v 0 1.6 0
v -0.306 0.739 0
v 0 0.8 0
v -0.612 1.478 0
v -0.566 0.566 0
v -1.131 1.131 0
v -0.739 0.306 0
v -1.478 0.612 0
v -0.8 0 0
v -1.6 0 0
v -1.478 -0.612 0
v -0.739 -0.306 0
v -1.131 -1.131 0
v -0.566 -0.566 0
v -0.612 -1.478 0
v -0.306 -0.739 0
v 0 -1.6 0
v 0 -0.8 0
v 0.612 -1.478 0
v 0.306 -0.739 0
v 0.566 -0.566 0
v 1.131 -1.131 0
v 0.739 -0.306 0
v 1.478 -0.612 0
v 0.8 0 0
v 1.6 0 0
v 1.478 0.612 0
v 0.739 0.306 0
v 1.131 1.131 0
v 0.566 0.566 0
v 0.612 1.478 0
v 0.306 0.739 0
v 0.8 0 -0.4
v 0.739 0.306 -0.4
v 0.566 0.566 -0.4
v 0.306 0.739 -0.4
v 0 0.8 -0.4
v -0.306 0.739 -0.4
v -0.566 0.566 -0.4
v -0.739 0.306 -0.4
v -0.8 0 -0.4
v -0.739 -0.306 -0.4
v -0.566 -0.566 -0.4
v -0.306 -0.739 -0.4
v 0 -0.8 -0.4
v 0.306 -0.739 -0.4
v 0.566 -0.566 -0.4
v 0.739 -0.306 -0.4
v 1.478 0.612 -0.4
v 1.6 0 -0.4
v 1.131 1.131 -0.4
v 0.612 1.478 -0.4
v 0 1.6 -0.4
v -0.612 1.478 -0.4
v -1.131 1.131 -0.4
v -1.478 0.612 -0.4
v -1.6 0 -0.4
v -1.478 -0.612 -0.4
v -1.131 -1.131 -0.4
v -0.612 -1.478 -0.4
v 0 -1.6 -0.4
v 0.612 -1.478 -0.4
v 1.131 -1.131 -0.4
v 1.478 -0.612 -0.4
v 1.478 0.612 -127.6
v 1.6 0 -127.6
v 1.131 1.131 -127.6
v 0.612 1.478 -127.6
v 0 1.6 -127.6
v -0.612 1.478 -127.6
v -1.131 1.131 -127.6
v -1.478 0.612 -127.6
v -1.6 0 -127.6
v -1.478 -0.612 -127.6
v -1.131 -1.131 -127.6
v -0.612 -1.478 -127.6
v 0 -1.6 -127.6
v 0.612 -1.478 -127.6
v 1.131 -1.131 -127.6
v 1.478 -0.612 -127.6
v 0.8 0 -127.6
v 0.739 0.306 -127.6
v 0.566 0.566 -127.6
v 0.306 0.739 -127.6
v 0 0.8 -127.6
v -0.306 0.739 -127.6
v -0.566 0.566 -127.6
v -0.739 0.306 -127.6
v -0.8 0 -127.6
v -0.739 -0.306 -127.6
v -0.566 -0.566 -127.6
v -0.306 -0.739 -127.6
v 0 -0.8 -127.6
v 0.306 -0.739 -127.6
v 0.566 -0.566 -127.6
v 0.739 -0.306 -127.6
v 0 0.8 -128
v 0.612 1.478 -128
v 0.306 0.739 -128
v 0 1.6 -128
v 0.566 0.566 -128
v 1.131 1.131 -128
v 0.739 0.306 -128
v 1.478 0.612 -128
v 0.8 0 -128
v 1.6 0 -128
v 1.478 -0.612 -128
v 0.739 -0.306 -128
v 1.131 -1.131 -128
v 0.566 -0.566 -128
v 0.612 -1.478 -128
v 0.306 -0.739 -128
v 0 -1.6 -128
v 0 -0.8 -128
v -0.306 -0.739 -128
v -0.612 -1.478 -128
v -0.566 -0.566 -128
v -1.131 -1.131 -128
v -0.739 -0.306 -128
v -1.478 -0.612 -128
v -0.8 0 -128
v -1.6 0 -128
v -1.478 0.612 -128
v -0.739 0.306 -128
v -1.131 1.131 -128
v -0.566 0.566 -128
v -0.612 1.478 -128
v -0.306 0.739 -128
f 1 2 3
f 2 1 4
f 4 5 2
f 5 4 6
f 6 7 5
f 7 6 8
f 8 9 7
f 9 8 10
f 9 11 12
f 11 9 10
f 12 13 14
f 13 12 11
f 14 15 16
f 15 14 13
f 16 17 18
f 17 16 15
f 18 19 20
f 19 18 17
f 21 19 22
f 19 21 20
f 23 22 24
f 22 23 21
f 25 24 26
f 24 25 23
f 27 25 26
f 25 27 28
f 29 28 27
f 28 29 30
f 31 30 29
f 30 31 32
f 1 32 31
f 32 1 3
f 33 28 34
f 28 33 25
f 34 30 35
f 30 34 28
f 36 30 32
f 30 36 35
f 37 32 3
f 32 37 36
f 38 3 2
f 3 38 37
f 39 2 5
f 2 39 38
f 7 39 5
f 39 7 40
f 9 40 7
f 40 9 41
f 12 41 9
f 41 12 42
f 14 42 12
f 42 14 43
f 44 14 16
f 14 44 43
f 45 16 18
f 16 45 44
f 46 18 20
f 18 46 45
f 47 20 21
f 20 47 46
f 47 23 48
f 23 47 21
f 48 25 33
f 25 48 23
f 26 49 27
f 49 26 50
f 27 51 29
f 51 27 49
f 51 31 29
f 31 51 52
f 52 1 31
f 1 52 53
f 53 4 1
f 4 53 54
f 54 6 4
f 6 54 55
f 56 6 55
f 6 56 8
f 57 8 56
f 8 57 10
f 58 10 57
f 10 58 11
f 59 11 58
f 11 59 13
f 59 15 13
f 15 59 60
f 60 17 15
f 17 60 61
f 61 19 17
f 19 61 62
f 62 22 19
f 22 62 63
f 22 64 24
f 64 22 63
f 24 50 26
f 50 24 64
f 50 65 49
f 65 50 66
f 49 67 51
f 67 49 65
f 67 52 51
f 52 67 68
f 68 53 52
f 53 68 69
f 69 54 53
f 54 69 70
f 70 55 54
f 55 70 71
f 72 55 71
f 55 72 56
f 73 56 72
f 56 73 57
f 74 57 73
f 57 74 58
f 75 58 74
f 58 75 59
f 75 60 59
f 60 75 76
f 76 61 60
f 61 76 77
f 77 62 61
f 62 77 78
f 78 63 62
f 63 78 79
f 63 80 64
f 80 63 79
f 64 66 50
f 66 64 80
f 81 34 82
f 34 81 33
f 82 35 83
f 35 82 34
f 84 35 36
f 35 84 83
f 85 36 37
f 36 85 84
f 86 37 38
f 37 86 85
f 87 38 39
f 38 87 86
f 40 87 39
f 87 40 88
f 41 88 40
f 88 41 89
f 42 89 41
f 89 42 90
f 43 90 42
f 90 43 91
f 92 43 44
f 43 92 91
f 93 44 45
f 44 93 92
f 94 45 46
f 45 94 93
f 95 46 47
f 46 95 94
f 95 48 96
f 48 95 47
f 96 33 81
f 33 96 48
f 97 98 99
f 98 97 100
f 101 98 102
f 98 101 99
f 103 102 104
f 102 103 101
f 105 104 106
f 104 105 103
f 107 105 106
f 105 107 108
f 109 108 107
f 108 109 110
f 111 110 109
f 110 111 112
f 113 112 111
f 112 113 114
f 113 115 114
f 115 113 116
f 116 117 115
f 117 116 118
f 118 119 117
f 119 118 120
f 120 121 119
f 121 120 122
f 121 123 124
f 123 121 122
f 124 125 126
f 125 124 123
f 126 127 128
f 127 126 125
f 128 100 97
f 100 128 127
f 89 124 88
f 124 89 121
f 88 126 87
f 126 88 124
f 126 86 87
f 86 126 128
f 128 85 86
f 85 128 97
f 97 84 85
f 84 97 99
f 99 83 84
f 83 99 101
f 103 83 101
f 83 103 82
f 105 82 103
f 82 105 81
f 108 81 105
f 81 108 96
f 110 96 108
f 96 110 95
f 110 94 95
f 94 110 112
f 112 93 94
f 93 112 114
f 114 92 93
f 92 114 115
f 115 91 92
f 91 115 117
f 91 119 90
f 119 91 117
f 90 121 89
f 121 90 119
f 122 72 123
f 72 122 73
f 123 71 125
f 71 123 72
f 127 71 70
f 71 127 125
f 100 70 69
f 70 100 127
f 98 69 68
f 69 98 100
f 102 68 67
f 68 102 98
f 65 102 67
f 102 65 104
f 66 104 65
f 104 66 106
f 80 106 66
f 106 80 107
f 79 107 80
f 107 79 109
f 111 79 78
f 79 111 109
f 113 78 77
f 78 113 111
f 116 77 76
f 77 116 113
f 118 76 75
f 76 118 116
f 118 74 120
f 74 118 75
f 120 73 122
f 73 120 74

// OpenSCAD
// file: ../p/4-4ring1.scad
use <../lib.scad>
function ldraw_lib__4_4ring1() = [
// 0 Ring  1 x 1.0
// 0 Name: 4-4ring1.dat
// 0 Author: James Jessiman
// 0 !LDRAW_ORG Primitive UPDATE 2009-01
// 0 !LICENSE Licensed under CC BY 4.0 : see CAreadme.txt
// 
// 0 BFC CERTIFY CCW
  [0,"BFC","CERTIFY"],
  [0,"BFC","CCW"],
// 
// 0 !HISTORY 1998-12-15 [PTadmin] Official Update 1998-10
// 0 !HISTORY 2002-04-08 [BrickCaster] Modified for BFC compliance
// 0 !HISTORY 2002-04-25 [PTadmin] Official Update 2002-02
// 0 !HISTORY 2007-06-24 [PTadmin] Header formatted for Contributor Agreement
// 0 !HISTORY 2008-07-01 [PTadmin] Official Update 2008-01
// 0 !HISTORY 2008-08-26 [cwdee] Switch polygon winding and rename
// 0 !HISTORY 2009-05-02 [PTadmin] Official Update 2009-01
// 
// 
// 4 16 -0.7654 0 1.8478 -0.3827 0 0.9239 0 0 1 0 0 2
  [4,16,-0.7654,0,1.8478,-0.3827,0,0.9239,0,0,1,0,0,2],
// 4 16 -1.4142 0 1.4142 -0.7071 0 0.7071 -0.3827 0 0.9239 -0.7654 0 1.8478
  [4,16,-1.4142,0,1.4142,-0.7071,0,0.7071,-0.3827,0,0.9239,-0.7654,0,1.8478],
// 4 16 -1.8478 0 0.7654 -0.9239 0 0.3827 -0.7071 0 0.7071 -1.4142 0 1.41420
  [4,16,-1.8478,0,0.7654,-0.9239,0,0.3827,-0.7071,0,0.7071,-1.4142,0,1.41420],
// 4 16 -2 0 0 -1 0 0 -0.9239 0 0.3827 -1.8478 0 0.7654
  [4,16,-2,0,0,-1,0,0,-0.9239,0,0.3827,-1.8478,0,0.7654],
// 4 16 -1.8478 0 -0.7654 -0.9239 0 -0.3827 -1 0 0 -2 0 0
  [4,16,-1.8478,0,-0.7654,-0.9239,0,-0.3827,-1,0,0,-2,0,0],
// 4 16 -1.4142 0 -1.4142 -0.7071 0 -0.7071 -0.9239 0 -0.3827 -1.8478 0 -0.7654
  [4,16,-1.4142,0,-1.4142,-0.7071,0,-0.7071,-0.9239,0,-0.3827,-1.8478,0,-0.7654],
// 4 16 -0.7654 0 -1.8478 -0.3827 0 -0.9239 -0.7071 0 -0.7071 -1.4142 0 -1.4142
  [4,16,-0.7654,0,-1.8478,-0.3827,0,-0.9239,-0.7071,0,-0.7071,-1.4142,0,-1.4142],
// 4 16 0 0 -2 0 0 -1 -0.3827 0 -0.9239 -0.7654 0 -1.8478
  [4,16,0,0,-2,0,0,-1,-0.3827,0,-0.9239,-0.7654,0,-1.8478],
// 4 16 0.7654 0 -1.8478 0.3827 0 -0.9239 0 0 -1 0 0 -2
  [4,16,0.7654,0,-1.8478,0.3827,0,-0.9239,0,0,-1,0,0,-2],
// 4 16 1.4142 0 -1.4142 0.7071 0 -0.7071 0.3827 0 -0.9239 0.7654 0 -1.8478
  [4,16,1.4142,0,-1.4142,0.7071,0,-0.7071,0.3827,0,-0.9239,0.7654,0,-1.8478],
// 4 16 1.8478 0 -0.7654 0.9239 0 -0.3827 0.7071 0 -0.7071 1.4142 0 -1.4142
  [4,16,1.8478,0,-0.7654,0.9239,0,-0.3827,0.7071,0,-0.7071,1.4142,0,-1.4142],
// 4 16 2 0 0 1 0 0 0.9239 0 -0.3827 1.8478 0 -0.7654
  [4,16,2,0,0,1,0,0,0.9239,0,-0.3827,1.8478,0,-0.7654],
// 4 16 1.8478 0 0.7654 0.9239 0 0.3827 1 0 0 2 0 0
  [4,16,1.8478,0,0.7654,0.9239,0,0.3827,1,0,0,2,0,0],
// 4 16 1.4142 0 1.4142 0.7071 0 0.7071 0.9239 0 0.3827 1.8478 0 0.7654
  [4,16,1.4142,0,1.4142,0.7071,0,0.7071,0.9239,0,0.3827,1.8478,0,0.7654],
// 4 16 0.7654 0 1.8478 0.3827 0 0.9239 0.7071 0 0.7071 1.4142 0 1.4142
  [4,16,0.7654,0,1.8478,0.3827,0,0.9239,0.7071,0,0.7071,1.4142,0,1.4142],
// 4 16 0 0 2 0 0 1 0.3827 0 0.9239 0.7654 0 1.8478
  [4,16,0,0,2,0,0,1,0.3827,0,0.9239,0.7654,0,1.8478],
// 0
];
module ldraw_lib__4_4ring1(step=0, col=false, unit=2/5, alt=false, line=0.2, solid=!$preview)
    makepoly(ldraw_lib__4_4ring1(), step=step, col=col, unit=unit, alt=alt, line=line, solid=solid);
ldraw_lib__4_4ring1(line=0.2);
// file: ../p/4-4edge.scad
use <../lib.scad>
function ldraw_lib__4_4edge() = [
// 0 Circle 1.0
// 0 Name: 4-4edge.dat
// 0 Author: James Jessiman
// 0 !LDRAW_ORG Primitive UPDATE 2017-01
// 0 !LICENSE Licensed under CC BY 4.0 : see CAreadme.txt
// 
// 0 BFC CERTIFY CCW
  [0,"BFC","CERTIFY"],
  [0,"BFC","CCW"],
// 
// 0 !HISTORY 1998-12-15 [PTadmin] Official Update 1998-10
// 0 !HISTORY 2005-12-28 [PTadmin] Official Update 2005-01
// 0 !HISTORY 2007-06-24 [PTadmin] Header formatted for Contributor Agreement
// 0 !HISTORY 2008-07-01 [PTadmin] Official Update 2008-01
// 0 !HISTORY 2017-01-15 [Steffen] BFCed
// 0 !HISTORY 2017-12-30 [PTadmin] Official Update 2017-01
// 
// 
// 2 24 1 0 0 0.9239 0 0.3827
  [2,24,1,0,0,0.9239,0,0.3827],
// 2 24 0.9239 0 0.3827 0.7071 0 0.7071
  [2,24,0.9239,0,0.3827,0.7071,0,0.7071],
// 2 24 0.7071 0 0.7071 0.3827 0 0.9239
  [2,24,0.7071,0,0.7071,0.3827,0,0.9239],
// 2 24 0.3827 0 0.9239 0 0 1
  [2,24,0.3827,0,0.9239,0,0,1],
// 2 24 0 0 1 -0.3827 0 0.9239
  [2,24,0,0,1,-0.3827,0,0.9239],
// 2 24 -0.3827 0 0.9239 -0.7071 0 0.7071
  [2,24,-0.3827,0,0.9239,-0.7071,0,0.7071],
// 2 24 -0.7071 0 0.7071 -0.9239 0 0.3827
  [2,24,-0.7071,0,0.7071,-0.9239,0,0.3827],
// 2 24 -0.9239 0 0.3827 -1 0 -0
  [2,24,-0.9239,0,0.3827,-1,0,-0],
// 2 24 -1 0 -0 -0.9239 0 -0.3827
  [2,24,-1,0,-0,-0.9239,0,-0.3827],
// 2 24 -0.9239 0 -0.3827 -0.7071 0 -0.7071
  [2,24,-0.9239,0,-0.3827,-0.7071,0,-0.7071],
// 2 24 -0.7071 0 -0.7071 -0.3827 0 -0.9239
  [2,24,-0.7071,0,-0.7071,-0.3827,0,-0.9239],
// 2 24 -0.3827 0 -0.9239 0 0 -1
  [2,24,-0.3827,0,-0.9239,0,0,-1],
// 2 24 0 0 -1 0.3827 0 -0.9239
  [2,24,0,0,-1,0.3827,0,-0.9239],
// 2 24 0.3827 0 -0.9239 0.7071 0 -0.7071
  [2,24,0.3827,0,-0.9239,0.7071,0,-0.7071],
// 2 24 0.7071 0 -0.7071 0.9239 0 -0.3827
  [2,24,0.7071,0,-0.7071,0.9239,0,-0.3827],
// 2 24 0.9239 0 -0.3827 1 0 0
  [2,24,0.9239,0,-0.3827,1,0,0],
];
module ldraw_lib__4_4edge(step=0, col=false, unit=2/5, alt=false, line=0.2, solid=!$preview)
    makepoly(ldraw_lib__4_4edge(), step=step, col=col, unit=unit, alt=alt, line=line, solid=solid);
ldraw_lib__4_4edge(line=0.2);
// file: ../p/4-4cyli.scad
use <../lib.scad>
function ldraw_lib__4_4cyli() = [
// 0 Cylinder 1.0
// 0 Name: 4-4cyli.dat
// 0 Author: James Jessiman
// 0 !LDRAW_ORG Primitive UPDATE 2005-01
// 0 !LICENSE Licensed under CC BY 4.0 : see CAreadme.txt
// 
// 0 BFC CERTIFY CCW
  [0,"BFC","CERTIFY"],
  [0,"BFC","CCW"],
// 
// 0 !HISTORY 1998-12-15 [PTadmin] Official Update 1998-10
// 0 !HISTORY 2002-03-23 [sbliss] Added BFC statement; merged headers from files in distributions LDraw 0.27 and Complete.
// 0 !HISTORY 2002-04-25 [PTadmin] Official Update 2002-02
// 0 !HISTORY 2004-12-14 [guyvivan] BFC CCW
// 0 !HISTORY 2005-12-28 [PTadmin] Official Update 2005-01
// 0 !HISTORY 2007-06-24 [PTadmin] Header formatted for Contributor Agreement
// 0 !HISTORY 2008-07-01 [PTadmin] Official Update 2008-01
// 
// 
// 4 16 1 1 0 0.9239 1 0.3827 0.9239 0 0.3827 1 0 0
  [4,16,1,1,0,0.9239,1,0.3827,0.9239,0,0.3827,1,0,0],
// 5 24 1 0 0 1 1 0 0.9239 0 0.3827 0.9239 0 -0.3827
  [5,24,1,0,0,1,1,0,0.9239,0,0.3827,0.9239,0,-0.3827],
// 4 16 0.9239 1 0.3827 0.7071 1 0.7071 0.7071 0 0.7071 0.9239 0 0.3827
  [4,16,0.9239,1,0.3827,0.7071,1,0.7071,0.7071,0,0.7071,0.9239,0,0.3827],
// 5 24 0.9239 0 0.3827 0.9239 1 0.3827 0.7071 0 0.7071 1 0 0
  [5,24,0.9239,0,0.3827,0.9239,1,0.3827,0.7071,0,0.7071,1,0,0],
// 4 16 0.7071 1 0.7071 0.3827 1 0.9239 0.3827 0 0.9239 0.7071 0 0.7071
  [4,16,0.7071,1,0.7071,0.3827,1,0.9239,0.3827,0,0.9239,0.7071,0,0.7071],
// 5 24 0.7071 0 0.7071 0.7071 1 0.7071 0.3827 0 0.9239 0.9239 0 0.3827
  [5,24,0.7071,0,0.7071,0.7071,1,0.7071,0.3827,0,0.9239,0.9239,0,0.3827],
// 4 16 0.3827 1 0.9239 0 1 1 0 0 1 0.3827 0 0.9239
  [4,16,0.3827,1,0.9239,0,1,1,0,0,1,0.3827,0,0.9239],
// 5 24 0.3827 0 0.9239 0.3827 1 0.9239 0 0 1 0.7071 0 0.7071
  [5,24,0.3827,0,0.9239,0.3827,1,0.9239,0,0,1,0.7071,0,0.7071],
// 4 16 0 1 1 -0.3827 1 0.9239 -0.3827 0 0.9239 0 0 1
  [4,16,0,1,1,-0.3827,1,0.9239,-0.3827,0,0.9239,0,0,1],
// 5 24 0 0 1 0 1 1 -0.3827 0 0.9239 0.3827 0 0.9239
  [5,24,0,0,1,0,1,1,-0.3827,0,0.9239,0.3827,0,0.9239],
// 4 16 -0.3827 1 0.9239 -0.7071 1 0.7071 -0.7071 0 0.7071 -0.3827 0 0.9239
  [4,16,-0.3827,1,0.9239,-0.7071,1,0.7071,-0.7071,0,0.7071,-0.3827,0,0.9239],
// 5 24 -0.3827 0 0.9239 -0.3827 1 0.9239 -0.7071 0 0.7071 0 0 1
  [5,24,-0.3827,0,0.9239,-0.3827,1,0.9239,-0.7071,0,0.7071,0,0,1],
// 4 16 -0.7071 1 0.7071 -0.9239 1 0.3827 -0.9239 0 0.3827 -0.7071 0 0.7071
  [4,16,-0.7071,1,0.7071,-0.9239,1,0.3827,-0.9239,0,0.3827,-0.7071,0,0.7071],
// 5 24 -0.7071 0 0.7071 -0.7071 1 0.7071 -0.9239 0 0.3827 -0.3827 0 0.9239
  [5,24,-0.7071,0,0.7071,-0.7071,1,0.7071,-0.9239,0,0.3827,-0.3827,0,0.9239],
// 4 16 -0.9239 1 0.3827 -1 1 0 -1 0 0 -0.9239 0 0.3827
  [4,16,-0.9239,1,0.3827,-1,1,0,-1,0,0,-0.9239,0,0.3827],
// 5 24 -0.9239 0 0.3827 -0.9239 1 0.3827 -1 0 0 -0.7071 0 0.7071
  [5,24,-0.9239,0,0.3827,-0.9239,1,0.3827,-1,0,0,-0.7071,0,0.7071],
// 4 16 -1 1 0 -0.9239 1 -0.3827 -0.9239 0 -0.3827 -1 0 0
  [4,16,-1,1,0,-0.9239,1,-0.3827,-0.9239,0,-0.3827,-1,0,0],
// 5 24 -1 0 0 -1 1 0 -0.9239 0 -0.3827 -0.9239 0 0.3827
  [5,24,-1,0,0,-1,1,0,-0.9239,0,-0.3827,-0.9239,0,0.3827],
// 4 16 -0.9239 1 -0.3827 -0.7071 1 -0.7071 -0.7071 0 -0.7071 -0.9239 0 -0.3827
  [4,16,-0.9239,1,-0.3827,-0.7071,1,-0.7071,-0.7071,0,-0.7071,-0.9239,0,-0.3827],
// 5 24 -0.9239 0 -0.3827 -0.9239 1 -0.3827 -0.7071 0 -0.7071 -1 0 0
  [5,24,-0.9239,0,-0.3827,-0.9239,1,-0.3827,-0.7071,0,-0.7071,-1,0,0],
// 4 16 -0.7071 1 -0.7071 -0.3827 1 -0.9239 -0.3827 0 -0.9239 -0.7071 0 -0.7071
  [4,16,-0.7071,1,-0.7071,-0.3827,1,-0.9239,-0.3827,0,-0.9239,-0.7071,0,-0.7071],
// 5 24 -0.7071 0 -0.7071 -0.7071 1 -0.7071 -0.3827 0 -0.9239 -0.9239 0 -0.3827
  [5,24,-0.7071,0,-0.7071,-0.7071,1,-0.7071,-0.3827,0,-0.9239,-0.9239,0,-0.3827],
// 4 16 -0.3827 1 -0.9239 0 1 -1 0 0 -1 -0.3827 0 -0.9239
  [4,16,-0.3827,1,-0.9239,0,1,-1,0,0,-1,-0.3827,0,-0.9239],
// 5 24 -0.3827 0 -0.9239 -0.3827 1 -0.9239 0 0 -1 -0.7071 0 -0.7071
  [5,24,-0.3827,0,-0.9239,-0.3827,1,-0.9239,0,0,-1,-0.7071,0,-0.7071],
// 4 16 0 1 -1 0.3827 1 -0.9239 0.3827 0 -0.9239 0 0 -1
  [4,16,0,1,-1,0.3827,1,-0.9239,0.3827,0,-0.9239,0,0,-1],
// 5 24 0 0 -1 0 1 -1 0.3827 0 -0.9239 -0.3827 0 -0.9239
  [5,24,0,0,-1,0,1,-1,0.3827,0,-0.9239,-0.3827,0,-0.9239],
// 4 16 0.3827 1 -0.9239 0.7071 1 -0.7071 0.7071 0 -0.7071 0.3827 0 -0.9239
  [4,16,0.3827,1,-0.9239,0.7071,1,-0.7071,0.7071,0,-0.7071,0.3827,0,-0.9239],
// 5 24 0.3827 0 -0.9239 0.3827 1 -0.9239 0.7071 0 -0.7071 0 0 -1
  [5,24,0.3827,0,-0.9239,0.3827,1,-0.9239,0.7071,0,-0.7071,0,0,-1],
// 4 16 0.7071 1 -0.7071 0.9239 1 -0.3827 0.9239 0 -0.3827 0.7071 0 -0.7071
  [4,16,0.7071,1,-0.7071,0.9239,1,-0.3827,0.9239,0,-0.3827,0.7071,0,-0.7071],
// 5 24 0.7071 0 -0.7071 0.7071 1 -0.7071 0.9239 0 -0.3827 0.3827 0 -0.9239
  [5,24,0.7071,0,-0.7071,0.7071,1,-0.7071,0.9239,0,-0.3827,0.3827,0,-0.9239],
// 4 16 0.9239 1 -0.3827 1 1 0 1 0 0 0.9239 0 -0.3827
  [4,16,0.9239,1,-0.3827,1,1,0,1,0,0,0.9239,0,-0.3827],
// 5 24 0.9239 0 -0.3827 0.9239 1 -0.3827 1 0 0 0.7071 0 -0.7071
  [5,24,0.9239,0,-0.3827,0.9239,1,-0.3827,1,0,0,0.7071,0,-0.7071],
// 0
];
module ldraw_lib__4_4cyli(step=0, col=false, unit=2/5, alt=false, line=0.2, solid=!$preview)
    makepoly(ldraw_lib__4_4cyli(), step=step, col=col, unit=unit, alt=alt, line=line, solid=solid);
ldraw_lib__4_4cyli(line=0.2);
// file: u9053.scad
use <../lib.scad>
use <../p/4-4cyli.scad>
use <../p/4-4edge.scad>
use <../p/4-4ring1.scad>
function ldraw_lib__u9053() = [
// 0 ~Technic Flex-System Hose End
// 0 Name: u9053.dat
// 0 Author: William Howard [WilliamH]
// 0 !LDRAW_ORG Part UPDATE 2011-02
// 0 !LICENSE Licensed under CC BY 2.0 and CC BY 4.0 : see CAreadme.txt
// 
// 0 BFC CERTIFY CCW
  [0,"BFC","CERTIFY"],
  [0,"BFC","CCW"],
// 
// 0 !HISTORY 2011-12-21 [cwdee] Reworked subparting technique
// 0 !HISTORY 2011-12-23 [PTadmin] Renamed from 76
// 0 !HISTORY 2011-12-29 [PTadmin] Official Update 2011-02
// 
// 
// 1 16 0 0 0 2 0 0 0 1 0 0 0 2 4-4ring1.dat
  [1,16,0,0,0,2,0,0,0,1,0,0,0,2, ldraw_lib__4_4ring1()],
// 1 16 0 0 0 2 0 0 0 1 0 0 0 2 4-4edge.dat
  [1,16,0,0,0,2,0,0,0,1,0,0,0,2, ldraw_lib__4_4edge()],
// 0 BFC INVERTNEXT
  [0,"BFC","INVERTNEXT"],
// 1 16 0 0 0 2 0 0 0 1 0 0 0 2 4-4cyli.dat
  [1,16,0,0,0,2,0,0,0,1,0,0,0,2, ldraw_lib__4_4cyli()],
// 1 16 0 0 0 4 0 0 0 1 0 0 0 4 4-4edge.dat
  [1,16,0,0,0,4,0,0,0,1,0,0,0,4, ldraw_lib__4_4edge()],
// 1 16 0 0 0 4 0 0 0 1 0 0 0 4 4-4cyli.dat
  [1,16,0,0,0,4,0,0,0,1,0,0,0,4, ldraw_lib__4_4cyli()],
// 0
];
module ldraw_lib__u9053(step=0, col=false, unit=2/5, alt=false, line=0.2, solid=!$preview)
    makepoly(ldraw_lib__u9053(), step=step, col=col, unit=unit, alt=alt, line=line, solid=solid);
ldraw_lib__u9053(line=0.2);
// file: 77.scad
use <../lib.scad>
use <../p/4-4cyli.scad>
function ldraw_lib__77() = [
// 0 ~Technic Flex-System Hose Segment
// 0 Name: 77.dat
// 0 Author: William Howard [WilliamH]
// 0 !LDRAW_ORG Part UPDATE 2011-02
// 0 !LICENSE Licensed under CC BY 2.0 and CC BY 4.0 : see CAreadme.txt
// 
// 0 BFC CERTIFY CCW
  [0,"BFC","CERTIFY"],
  [0,"BFC","CCW"],
// 
// 0 !HISTORY 2011-12-21 [cwdee] Reworked subparting technique
// 0 !HISTORY 2011-12-29 [PTadmin] Official Update 2011-02
// 
// 
// 1 16 0 0 0 4 0 0 0 1 0 0 0 4 4-4cyli.dat
  [1,16,0,0,0,4,0,0,0,1,0,0,0,4, ldraw_lib__4_4cyli()],
// 0 BFC INVERTNEXT
  [0,"BFC","INVERTNEXT"],
// 1 16 0 0 0 2 0 0 0 1 0 0 0 2 4-4cyli.dat
  [1,16,0,0,0,2,0,0,0,1,0,0,0,2, ldraw_lib__4_4cyli()],
// 0
];
module ldraw_lib__77(step=0, col=false, unit=2/5, alt=false, line=0.2, solid=!$preview)
    makepoly(ldraw_lib__77(), step=step, col=col, unit=unit, alt=alt, line=line, solid=solid);
ldraw_lib__77(line=0.2);
// main file
use <../lib.scad>
use <77.scad>
use <u9053.scad>
function ldraw_lib__71192() = [
// 0 Technic Flex-System Hose 16L (320LDU)
// 0 Name: 71192.dat
// 0 Author: Tim Gould [timgould]
// 0 !LDRAW_ORG Part UPDATE 2011-02
// 0 !LICENSE Licensed under CC BY 4.0 : see CAreadme.txt
// 
// 0 BFC CERTIFY CCW
  [0,"BFC","CERTIFY"],
  [0,"BFC","CCW"],
// 
// 0 !KEYWORDS bar, BrickLink 75c16, Rebrickable 75c16, tube
// 
// 0 !HISTORY 2011-12-29 [PTadmin] Official Update 2011-02
// 
// 
// 1 16 0 0 0 1 0 0 0 1 0 0 0 1 u9053.dat
  [1,16,0,0,0,1,0,0,0,1,0,0,0,1, ldraw_lib__u9053()],
// 1 16 0 1 0 1 0 0 0 318 0 0 0 1 77.dat
  [1,16,0,1,0,1,0,0,0,318,0,0,0,1, ldraw_lib__77()],
// 1 16 0 320 0 -1 0 0 0 -1 0 0 0 1 u9053.dat
  [1,16,0,320,0,-1,0,0,0,-1,0,0,0,1, ldraw_lib__u9053()],
];
module ldraw_lib__71192(step=0, col=false, unit=2/5, alt=false, line=0.2, solid=!$preview)
    makepoly(ldraw_lib__71192(), step=step, col=col, unit=unit, alt=alt, line=line, solid=solid);
ldraw_lib__71192(line=0.2);
